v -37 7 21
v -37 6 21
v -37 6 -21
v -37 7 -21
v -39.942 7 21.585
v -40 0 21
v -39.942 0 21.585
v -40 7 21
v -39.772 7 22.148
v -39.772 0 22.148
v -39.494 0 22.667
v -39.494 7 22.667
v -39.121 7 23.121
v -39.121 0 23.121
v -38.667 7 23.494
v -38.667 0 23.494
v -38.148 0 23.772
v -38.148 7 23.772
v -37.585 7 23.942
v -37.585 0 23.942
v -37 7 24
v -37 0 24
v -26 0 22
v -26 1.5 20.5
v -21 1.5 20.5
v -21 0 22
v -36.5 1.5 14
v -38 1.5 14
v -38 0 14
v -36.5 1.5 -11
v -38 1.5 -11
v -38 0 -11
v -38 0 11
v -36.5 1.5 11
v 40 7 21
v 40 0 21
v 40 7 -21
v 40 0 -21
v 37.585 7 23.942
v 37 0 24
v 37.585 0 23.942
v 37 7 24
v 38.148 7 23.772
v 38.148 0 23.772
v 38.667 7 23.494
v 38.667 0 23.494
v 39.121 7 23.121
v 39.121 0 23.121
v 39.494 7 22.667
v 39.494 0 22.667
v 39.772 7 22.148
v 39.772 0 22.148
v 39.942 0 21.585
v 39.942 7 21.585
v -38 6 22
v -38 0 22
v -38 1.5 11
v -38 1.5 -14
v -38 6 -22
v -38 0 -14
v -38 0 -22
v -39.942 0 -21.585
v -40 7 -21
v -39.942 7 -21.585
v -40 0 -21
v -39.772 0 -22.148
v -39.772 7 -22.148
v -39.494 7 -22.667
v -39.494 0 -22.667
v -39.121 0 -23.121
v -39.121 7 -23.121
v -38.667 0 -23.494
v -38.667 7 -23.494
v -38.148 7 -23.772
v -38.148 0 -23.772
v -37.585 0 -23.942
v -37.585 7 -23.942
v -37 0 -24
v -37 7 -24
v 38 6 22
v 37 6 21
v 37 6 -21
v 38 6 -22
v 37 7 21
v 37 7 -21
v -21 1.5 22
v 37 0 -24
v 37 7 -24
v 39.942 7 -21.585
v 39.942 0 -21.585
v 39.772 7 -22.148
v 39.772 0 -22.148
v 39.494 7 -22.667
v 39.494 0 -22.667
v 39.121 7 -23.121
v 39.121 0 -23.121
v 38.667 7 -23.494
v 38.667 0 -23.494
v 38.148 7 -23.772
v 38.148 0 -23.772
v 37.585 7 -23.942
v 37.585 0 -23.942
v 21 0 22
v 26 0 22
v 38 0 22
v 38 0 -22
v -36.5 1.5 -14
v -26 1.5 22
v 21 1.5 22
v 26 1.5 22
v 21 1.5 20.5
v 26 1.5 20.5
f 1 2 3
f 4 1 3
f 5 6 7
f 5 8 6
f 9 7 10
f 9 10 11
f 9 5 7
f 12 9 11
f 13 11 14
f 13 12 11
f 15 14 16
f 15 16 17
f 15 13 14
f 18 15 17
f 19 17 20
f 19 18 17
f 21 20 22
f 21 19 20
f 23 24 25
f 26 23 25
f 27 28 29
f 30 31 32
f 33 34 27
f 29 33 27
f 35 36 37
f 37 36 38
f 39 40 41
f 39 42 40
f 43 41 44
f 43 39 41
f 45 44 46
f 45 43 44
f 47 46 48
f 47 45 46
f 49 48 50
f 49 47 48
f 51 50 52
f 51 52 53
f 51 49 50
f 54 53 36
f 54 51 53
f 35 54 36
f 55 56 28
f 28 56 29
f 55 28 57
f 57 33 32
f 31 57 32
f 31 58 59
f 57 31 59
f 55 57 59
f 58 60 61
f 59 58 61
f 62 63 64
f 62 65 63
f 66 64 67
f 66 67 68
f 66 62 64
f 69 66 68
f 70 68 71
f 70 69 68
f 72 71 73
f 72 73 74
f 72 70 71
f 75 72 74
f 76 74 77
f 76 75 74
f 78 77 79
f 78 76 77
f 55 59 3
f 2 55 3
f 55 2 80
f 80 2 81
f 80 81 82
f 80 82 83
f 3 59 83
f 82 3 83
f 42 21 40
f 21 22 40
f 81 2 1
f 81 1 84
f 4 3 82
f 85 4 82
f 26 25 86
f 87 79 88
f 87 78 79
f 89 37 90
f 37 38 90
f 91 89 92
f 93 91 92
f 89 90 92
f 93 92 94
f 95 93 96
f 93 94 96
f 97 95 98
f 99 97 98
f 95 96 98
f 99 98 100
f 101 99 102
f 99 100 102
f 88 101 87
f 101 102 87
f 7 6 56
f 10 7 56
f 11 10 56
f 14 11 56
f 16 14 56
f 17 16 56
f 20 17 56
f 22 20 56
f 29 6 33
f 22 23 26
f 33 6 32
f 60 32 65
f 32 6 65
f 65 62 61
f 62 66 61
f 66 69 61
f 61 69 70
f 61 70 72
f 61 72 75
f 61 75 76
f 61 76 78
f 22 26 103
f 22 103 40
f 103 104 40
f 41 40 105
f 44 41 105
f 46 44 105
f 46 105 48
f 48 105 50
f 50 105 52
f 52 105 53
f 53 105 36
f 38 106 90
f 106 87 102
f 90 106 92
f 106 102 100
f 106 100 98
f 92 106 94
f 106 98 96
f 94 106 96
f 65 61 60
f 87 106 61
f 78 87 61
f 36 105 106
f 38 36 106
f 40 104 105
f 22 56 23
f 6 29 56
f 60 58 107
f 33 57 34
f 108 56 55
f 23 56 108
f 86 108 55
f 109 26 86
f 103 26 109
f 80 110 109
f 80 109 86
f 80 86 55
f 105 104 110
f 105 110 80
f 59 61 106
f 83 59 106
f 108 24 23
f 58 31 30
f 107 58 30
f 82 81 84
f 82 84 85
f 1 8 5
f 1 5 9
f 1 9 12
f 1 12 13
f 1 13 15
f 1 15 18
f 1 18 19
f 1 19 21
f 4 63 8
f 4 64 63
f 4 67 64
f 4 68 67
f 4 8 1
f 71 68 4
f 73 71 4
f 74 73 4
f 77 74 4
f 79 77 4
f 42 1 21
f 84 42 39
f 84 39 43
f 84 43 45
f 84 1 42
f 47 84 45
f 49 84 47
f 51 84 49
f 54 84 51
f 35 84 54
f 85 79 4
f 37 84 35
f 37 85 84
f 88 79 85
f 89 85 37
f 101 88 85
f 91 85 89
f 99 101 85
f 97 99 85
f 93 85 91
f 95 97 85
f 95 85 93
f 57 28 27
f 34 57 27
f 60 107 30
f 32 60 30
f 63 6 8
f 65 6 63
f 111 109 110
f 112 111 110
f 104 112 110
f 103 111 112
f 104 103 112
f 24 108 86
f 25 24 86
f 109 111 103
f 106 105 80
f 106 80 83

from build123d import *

# Parameters (mm, degrees)
SKETCH1_W           = 80
SKETCH1_H           = 48
SKETCH1_W_2         = 76
SKETCH1_H_2         = 44
BOSS_EXTRUDE1_DEPTH = 6
SKETCH2_W           = 80
SKETCH2_H           = 48
SKETCH2_W_2         = 74
SKETCH2_H_2         = 42
BOSS_EXTRUDE2_DEPTH = 1
FILLET1_R           = 3
SKETCH3_W           = 5
SKETCH3_H           = 1.5
SKETCH3_W_2         = 1.5
SKETCH3_H_2         = 3
BOSS_EXTRUDE3_DEPTH = 1.5
CHAMFER2_SIZE       = 1.5


with BuildPart() as part:
    # Sketch1 → Boss-Extrude1 (new body)
    with BuildSketch(Plane(origin=(0, 0, 0), x_dir=(1, 0, 0), z_dir=(0, 1, 0))):
        Rectangle(SKETCH1_W, SKETCH1_H)
        Rectangle(SKETCH1_W_2, SKETCH1_H_2, mode=Mode.SUBTRACT)
    extrude(amount=BOSS_EXTRUDE1_DEPTH)

    # Sketch2 → Boss-Extrude2 (add)
    with BuildSketch(Plane(origin=(0, 6, 0), x_dir=(1, 0, 0), z_dir=(0, 1, 0))):
        Rectangle(SKETCH2_W, SKETCH2_H)
        Rectangle(SKETCH2_W_2, SKETCH2_H_2, mode=Mode.SUBTRACT)
    extrude(amount=BOSS_EXTRUDE2_DEPTH)

    # Fillet1
    fillet1_edges = [part.edges().sort_by_distance(p)[0] for p in [
        (40, 3.5, -24),
        (40, 3.5, 24),
        (-40, 3.5, 24),
        (-40, 3.5, -24),
    ]]
    fillet(fillet1_edges, radius=FILLET1_R)

    # Sketch3 → Boss-Extrude3 (add)
    with BuildSketch(Plane.XZ):
        with Locations((-23.5, 21.25)):
            Rectangle(SKETCH3_W, SKETCH3_H)
        with Locations((-37.25, 12.5)):
            Rectangle(SKETCH3_W_2, SKETCH3_H_2)
        with Locations((23.5, 21.25)):
            Rectangle(SKETCH3_W, SKETCH3_H)
        with Locations((-37.25, -12.5)):
            Rectangle(SKETCH3_W_2, SKETCH3_H_2)
    extrude(amount=-BOSS_EXTRUDE3_DEPTH)

    # Chamfer2
    chamfer2_edges = [part.edges().sort_by_distance(p)[0] for p in [
        (23.5, 0, 20.5),
        (-23.5, 0, 20.5),
        (-36.5, 0, -12.5),
        (-36.5, 0, 12.5),
    ]]
    chamfer(chamfer2_edges, length=CHAMFER2_SIZE - 0.0001)  # a hair under: the kernel refuses the full size


solid = part.part
